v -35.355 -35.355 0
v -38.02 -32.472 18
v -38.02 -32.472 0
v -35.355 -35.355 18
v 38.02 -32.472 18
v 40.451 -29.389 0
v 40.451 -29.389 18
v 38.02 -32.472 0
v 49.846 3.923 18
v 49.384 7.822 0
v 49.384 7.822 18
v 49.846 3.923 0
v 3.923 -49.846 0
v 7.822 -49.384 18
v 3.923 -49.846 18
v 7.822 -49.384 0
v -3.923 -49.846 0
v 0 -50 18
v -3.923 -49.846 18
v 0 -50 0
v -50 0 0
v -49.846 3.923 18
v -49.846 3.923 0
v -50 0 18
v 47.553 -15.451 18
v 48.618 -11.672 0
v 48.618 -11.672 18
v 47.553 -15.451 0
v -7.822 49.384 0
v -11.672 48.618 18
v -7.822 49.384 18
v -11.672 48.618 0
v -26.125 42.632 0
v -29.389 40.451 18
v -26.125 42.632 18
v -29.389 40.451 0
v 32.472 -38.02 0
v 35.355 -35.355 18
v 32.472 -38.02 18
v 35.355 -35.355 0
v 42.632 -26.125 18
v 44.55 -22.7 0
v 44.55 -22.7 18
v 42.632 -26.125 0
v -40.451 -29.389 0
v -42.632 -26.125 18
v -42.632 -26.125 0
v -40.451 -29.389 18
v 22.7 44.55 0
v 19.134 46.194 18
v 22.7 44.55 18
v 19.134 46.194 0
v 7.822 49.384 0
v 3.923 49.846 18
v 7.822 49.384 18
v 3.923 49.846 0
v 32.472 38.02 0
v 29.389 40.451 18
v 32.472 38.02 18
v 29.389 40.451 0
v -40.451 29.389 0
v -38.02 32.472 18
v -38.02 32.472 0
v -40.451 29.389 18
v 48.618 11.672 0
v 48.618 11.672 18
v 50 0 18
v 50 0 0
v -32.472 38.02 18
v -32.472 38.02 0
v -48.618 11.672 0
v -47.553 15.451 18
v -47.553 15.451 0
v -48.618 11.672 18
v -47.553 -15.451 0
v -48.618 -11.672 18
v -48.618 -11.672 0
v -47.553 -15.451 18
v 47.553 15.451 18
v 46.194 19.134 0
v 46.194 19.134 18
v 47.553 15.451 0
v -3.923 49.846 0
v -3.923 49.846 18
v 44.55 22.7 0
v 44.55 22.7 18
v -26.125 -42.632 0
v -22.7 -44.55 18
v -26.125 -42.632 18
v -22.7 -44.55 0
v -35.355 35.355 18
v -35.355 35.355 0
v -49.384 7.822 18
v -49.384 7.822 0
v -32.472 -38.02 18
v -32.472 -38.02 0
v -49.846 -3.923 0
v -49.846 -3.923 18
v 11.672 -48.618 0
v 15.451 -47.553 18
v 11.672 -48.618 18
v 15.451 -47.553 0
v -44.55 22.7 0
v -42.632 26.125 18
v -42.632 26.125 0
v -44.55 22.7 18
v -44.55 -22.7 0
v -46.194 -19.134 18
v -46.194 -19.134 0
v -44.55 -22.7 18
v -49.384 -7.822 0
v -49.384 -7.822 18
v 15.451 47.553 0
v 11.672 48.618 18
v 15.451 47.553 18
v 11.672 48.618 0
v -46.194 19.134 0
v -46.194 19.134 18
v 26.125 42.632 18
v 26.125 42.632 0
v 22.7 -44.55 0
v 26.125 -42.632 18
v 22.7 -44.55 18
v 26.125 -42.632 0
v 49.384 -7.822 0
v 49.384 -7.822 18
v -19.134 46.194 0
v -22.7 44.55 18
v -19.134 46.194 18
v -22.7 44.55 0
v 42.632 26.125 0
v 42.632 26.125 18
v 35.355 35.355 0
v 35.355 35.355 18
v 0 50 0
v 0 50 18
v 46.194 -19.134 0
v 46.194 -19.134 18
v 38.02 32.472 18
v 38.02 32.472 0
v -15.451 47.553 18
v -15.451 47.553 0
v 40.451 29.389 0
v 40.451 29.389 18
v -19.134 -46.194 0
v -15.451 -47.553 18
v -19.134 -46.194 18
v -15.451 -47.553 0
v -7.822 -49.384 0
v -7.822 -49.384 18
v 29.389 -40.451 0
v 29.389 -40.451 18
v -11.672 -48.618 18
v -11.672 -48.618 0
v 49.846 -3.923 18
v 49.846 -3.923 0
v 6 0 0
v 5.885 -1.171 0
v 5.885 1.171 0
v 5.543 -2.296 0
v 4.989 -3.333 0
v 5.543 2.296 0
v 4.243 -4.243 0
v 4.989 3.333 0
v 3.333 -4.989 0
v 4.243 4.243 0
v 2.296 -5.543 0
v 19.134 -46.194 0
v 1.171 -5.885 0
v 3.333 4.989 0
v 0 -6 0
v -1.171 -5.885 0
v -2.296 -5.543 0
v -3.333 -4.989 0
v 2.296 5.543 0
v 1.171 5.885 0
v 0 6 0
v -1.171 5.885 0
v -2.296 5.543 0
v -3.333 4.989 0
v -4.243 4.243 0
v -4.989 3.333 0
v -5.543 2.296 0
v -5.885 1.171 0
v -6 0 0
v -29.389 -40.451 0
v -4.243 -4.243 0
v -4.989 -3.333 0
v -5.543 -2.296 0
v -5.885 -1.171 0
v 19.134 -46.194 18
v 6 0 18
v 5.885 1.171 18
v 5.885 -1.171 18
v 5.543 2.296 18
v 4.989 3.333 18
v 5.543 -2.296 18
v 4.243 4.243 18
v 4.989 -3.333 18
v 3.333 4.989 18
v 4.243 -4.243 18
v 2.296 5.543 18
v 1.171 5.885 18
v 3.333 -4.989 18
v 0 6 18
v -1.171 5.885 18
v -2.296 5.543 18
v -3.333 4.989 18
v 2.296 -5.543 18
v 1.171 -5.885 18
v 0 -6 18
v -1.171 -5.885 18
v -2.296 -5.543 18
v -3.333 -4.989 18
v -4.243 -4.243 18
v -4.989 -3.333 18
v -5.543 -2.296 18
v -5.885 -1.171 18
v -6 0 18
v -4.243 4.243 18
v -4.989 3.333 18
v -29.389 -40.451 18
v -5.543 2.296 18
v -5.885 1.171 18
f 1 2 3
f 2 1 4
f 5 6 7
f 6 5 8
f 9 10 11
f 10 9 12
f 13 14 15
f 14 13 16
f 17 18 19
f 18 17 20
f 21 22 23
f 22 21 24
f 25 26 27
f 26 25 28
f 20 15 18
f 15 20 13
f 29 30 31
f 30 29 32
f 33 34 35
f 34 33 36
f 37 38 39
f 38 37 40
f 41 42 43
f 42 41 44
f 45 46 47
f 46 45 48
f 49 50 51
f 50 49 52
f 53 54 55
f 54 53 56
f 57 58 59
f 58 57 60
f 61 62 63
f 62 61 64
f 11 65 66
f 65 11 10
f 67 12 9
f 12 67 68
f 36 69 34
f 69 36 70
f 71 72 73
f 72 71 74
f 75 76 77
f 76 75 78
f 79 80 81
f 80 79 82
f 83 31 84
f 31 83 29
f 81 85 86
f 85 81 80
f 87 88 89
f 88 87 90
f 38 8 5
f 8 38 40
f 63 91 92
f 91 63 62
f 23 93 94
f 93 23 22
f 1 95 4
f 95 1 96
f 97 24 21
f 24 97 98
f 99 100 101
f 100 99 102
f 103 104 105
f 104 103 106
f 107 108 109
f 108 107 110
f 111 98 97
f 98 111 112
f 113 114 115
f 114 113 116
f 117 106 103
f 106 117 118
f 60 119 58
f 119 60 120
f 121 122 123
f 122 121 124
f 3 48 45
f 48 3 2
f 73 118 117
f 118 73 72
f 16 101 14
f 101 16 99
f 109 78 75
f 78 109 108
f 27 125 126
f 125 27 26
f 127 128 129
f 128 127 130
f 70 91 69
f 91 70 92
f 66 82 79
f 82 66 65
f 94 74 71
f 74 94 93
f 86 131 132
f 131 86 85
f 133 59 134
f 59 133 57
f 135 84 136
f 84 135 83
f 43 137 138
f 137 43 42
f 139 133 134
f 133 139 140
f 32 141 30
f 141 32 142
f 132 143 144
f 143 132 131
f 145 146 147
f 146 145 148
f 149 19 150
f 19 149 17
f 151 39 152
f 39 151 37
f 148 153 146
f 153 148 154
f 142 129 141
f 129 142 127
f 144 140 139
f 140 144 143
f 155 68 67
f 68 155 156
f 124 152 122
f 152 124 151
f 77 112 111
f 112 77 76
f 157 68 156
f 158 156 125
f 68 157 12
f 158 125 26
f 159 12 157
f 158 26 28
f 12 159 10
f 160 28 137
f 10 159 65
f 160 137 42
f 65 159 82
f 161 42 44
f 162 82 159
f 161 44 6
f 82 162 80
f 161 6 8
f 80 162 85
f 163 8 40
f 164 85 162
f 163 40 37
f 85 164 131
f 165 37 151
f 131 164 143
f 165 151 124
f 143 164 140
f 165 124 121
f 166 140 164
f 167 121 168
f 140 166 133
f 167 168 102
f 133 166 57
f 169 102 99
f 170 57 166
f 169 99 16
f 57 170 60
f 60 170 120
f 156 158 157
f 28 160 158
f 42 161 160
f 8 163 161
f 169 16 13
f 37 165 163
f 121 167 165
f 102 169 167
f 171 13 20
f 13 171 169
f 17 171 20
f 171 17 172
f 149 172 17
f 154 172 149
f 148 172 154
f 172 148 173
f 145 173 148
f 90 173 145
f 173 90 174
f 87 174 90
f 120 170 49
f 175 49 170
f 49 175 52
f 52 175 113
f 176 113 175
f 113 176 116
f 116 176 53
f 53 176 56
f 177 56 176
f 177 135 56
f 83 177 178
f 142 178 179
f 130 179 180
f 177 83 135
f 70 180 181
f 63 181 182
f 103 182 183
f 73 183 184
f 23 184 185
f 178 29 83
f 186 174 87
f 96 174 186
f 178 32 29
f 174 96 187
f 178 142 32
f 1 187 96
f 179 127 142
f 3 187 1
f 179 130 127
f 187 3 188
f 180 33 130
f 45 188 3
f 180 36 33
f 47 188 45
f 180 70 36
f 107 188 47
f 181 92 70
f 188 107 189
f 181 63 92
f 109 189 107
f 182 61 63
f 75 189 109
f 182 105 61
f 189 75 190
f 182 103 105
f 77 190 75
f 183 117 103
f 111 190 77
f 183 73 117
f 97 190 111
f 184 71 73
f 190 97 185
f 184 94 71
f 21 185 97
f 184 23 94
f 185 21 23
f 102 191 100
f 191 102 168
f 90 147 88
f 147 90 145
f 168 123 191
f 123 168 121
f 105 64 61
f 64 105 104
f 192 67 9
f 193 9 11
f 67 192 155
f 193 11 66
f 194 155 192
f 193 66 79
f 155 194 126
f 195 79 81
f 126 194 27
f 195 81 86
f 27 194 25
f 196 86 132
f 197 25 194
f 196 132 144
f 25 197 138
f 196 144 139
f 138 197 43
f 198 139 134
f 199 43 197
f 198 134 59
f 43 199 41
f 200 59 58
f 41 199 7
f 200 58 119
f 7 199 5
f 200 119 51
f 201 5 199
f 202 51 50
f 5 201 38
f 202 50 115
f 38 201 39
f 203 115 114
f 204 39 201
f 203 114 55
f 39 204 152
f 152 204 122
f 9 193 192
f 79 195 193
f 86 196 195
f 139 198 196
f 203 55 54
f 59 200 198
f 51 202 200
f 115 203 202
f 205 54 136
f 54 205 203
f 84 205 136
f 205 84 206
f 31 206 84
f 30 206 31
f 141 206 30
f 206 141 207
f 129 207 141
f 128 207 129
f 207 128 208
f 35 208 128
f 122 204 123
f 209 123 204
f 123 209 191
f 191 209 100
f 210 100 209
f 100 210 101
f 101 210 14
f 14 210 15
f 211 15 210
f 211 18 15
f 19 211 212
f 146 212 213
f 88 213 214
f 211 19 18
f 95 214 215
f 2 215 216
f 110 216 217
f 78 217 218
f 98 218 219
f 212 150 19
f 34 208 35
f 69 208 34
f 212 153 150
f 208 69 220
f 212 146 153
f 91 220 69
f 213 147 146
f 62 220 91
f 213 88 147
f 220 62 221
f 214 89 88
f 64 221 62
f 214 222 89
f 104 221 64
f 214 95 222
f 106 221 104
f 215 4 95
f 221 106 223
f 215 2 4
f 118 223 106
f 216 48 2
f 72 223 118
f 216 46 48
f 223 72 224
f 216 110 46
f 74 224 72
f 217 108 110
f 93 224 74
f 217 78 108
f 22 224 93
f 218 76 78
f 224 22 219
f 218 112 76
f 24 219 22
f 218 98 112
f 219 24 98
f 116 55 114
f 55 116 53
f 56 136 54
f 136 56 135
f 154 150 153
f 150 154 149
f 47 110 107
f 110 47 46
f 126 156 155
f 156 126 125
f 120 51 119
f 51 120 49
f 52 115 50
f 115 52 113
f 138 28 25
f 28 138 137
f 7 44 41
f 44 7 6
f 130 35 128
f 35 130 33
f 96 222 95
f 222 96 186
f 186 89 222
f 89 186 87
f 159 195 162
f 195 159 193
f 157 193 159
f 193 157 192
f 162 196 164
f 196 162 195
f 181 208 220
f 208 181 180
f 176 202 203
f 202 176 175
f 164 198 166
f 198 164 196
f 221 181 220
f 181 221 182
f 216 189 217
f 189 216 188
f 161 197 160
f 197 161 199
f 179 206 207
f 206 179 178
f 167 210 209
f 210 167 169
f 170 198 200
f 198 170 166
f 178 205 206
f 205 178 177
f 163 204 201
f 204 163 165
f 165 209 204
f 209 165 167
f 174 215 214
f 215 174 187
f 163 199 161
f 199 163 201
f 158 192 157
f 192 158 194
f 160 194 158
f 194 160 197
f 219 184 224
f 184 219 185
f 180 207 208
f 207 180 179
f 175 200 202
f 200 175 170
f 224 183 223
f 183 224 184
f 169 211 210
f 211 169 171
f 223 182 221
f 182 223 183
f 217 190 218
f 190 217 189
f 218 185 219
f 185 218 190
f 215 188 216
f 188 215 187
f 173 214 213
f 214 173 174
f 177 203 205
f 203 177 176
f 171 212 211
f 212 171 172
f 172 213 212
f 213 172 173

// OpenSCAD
module omni_hub(d=100,w=18){
  difference(){
    cylinder(h=w,r=d/2,$fn=80);
    translate([0,0,-0.1]) cylinder(h=w+0.2,r=6,$fn=32);
  }
}
omni_hub();
